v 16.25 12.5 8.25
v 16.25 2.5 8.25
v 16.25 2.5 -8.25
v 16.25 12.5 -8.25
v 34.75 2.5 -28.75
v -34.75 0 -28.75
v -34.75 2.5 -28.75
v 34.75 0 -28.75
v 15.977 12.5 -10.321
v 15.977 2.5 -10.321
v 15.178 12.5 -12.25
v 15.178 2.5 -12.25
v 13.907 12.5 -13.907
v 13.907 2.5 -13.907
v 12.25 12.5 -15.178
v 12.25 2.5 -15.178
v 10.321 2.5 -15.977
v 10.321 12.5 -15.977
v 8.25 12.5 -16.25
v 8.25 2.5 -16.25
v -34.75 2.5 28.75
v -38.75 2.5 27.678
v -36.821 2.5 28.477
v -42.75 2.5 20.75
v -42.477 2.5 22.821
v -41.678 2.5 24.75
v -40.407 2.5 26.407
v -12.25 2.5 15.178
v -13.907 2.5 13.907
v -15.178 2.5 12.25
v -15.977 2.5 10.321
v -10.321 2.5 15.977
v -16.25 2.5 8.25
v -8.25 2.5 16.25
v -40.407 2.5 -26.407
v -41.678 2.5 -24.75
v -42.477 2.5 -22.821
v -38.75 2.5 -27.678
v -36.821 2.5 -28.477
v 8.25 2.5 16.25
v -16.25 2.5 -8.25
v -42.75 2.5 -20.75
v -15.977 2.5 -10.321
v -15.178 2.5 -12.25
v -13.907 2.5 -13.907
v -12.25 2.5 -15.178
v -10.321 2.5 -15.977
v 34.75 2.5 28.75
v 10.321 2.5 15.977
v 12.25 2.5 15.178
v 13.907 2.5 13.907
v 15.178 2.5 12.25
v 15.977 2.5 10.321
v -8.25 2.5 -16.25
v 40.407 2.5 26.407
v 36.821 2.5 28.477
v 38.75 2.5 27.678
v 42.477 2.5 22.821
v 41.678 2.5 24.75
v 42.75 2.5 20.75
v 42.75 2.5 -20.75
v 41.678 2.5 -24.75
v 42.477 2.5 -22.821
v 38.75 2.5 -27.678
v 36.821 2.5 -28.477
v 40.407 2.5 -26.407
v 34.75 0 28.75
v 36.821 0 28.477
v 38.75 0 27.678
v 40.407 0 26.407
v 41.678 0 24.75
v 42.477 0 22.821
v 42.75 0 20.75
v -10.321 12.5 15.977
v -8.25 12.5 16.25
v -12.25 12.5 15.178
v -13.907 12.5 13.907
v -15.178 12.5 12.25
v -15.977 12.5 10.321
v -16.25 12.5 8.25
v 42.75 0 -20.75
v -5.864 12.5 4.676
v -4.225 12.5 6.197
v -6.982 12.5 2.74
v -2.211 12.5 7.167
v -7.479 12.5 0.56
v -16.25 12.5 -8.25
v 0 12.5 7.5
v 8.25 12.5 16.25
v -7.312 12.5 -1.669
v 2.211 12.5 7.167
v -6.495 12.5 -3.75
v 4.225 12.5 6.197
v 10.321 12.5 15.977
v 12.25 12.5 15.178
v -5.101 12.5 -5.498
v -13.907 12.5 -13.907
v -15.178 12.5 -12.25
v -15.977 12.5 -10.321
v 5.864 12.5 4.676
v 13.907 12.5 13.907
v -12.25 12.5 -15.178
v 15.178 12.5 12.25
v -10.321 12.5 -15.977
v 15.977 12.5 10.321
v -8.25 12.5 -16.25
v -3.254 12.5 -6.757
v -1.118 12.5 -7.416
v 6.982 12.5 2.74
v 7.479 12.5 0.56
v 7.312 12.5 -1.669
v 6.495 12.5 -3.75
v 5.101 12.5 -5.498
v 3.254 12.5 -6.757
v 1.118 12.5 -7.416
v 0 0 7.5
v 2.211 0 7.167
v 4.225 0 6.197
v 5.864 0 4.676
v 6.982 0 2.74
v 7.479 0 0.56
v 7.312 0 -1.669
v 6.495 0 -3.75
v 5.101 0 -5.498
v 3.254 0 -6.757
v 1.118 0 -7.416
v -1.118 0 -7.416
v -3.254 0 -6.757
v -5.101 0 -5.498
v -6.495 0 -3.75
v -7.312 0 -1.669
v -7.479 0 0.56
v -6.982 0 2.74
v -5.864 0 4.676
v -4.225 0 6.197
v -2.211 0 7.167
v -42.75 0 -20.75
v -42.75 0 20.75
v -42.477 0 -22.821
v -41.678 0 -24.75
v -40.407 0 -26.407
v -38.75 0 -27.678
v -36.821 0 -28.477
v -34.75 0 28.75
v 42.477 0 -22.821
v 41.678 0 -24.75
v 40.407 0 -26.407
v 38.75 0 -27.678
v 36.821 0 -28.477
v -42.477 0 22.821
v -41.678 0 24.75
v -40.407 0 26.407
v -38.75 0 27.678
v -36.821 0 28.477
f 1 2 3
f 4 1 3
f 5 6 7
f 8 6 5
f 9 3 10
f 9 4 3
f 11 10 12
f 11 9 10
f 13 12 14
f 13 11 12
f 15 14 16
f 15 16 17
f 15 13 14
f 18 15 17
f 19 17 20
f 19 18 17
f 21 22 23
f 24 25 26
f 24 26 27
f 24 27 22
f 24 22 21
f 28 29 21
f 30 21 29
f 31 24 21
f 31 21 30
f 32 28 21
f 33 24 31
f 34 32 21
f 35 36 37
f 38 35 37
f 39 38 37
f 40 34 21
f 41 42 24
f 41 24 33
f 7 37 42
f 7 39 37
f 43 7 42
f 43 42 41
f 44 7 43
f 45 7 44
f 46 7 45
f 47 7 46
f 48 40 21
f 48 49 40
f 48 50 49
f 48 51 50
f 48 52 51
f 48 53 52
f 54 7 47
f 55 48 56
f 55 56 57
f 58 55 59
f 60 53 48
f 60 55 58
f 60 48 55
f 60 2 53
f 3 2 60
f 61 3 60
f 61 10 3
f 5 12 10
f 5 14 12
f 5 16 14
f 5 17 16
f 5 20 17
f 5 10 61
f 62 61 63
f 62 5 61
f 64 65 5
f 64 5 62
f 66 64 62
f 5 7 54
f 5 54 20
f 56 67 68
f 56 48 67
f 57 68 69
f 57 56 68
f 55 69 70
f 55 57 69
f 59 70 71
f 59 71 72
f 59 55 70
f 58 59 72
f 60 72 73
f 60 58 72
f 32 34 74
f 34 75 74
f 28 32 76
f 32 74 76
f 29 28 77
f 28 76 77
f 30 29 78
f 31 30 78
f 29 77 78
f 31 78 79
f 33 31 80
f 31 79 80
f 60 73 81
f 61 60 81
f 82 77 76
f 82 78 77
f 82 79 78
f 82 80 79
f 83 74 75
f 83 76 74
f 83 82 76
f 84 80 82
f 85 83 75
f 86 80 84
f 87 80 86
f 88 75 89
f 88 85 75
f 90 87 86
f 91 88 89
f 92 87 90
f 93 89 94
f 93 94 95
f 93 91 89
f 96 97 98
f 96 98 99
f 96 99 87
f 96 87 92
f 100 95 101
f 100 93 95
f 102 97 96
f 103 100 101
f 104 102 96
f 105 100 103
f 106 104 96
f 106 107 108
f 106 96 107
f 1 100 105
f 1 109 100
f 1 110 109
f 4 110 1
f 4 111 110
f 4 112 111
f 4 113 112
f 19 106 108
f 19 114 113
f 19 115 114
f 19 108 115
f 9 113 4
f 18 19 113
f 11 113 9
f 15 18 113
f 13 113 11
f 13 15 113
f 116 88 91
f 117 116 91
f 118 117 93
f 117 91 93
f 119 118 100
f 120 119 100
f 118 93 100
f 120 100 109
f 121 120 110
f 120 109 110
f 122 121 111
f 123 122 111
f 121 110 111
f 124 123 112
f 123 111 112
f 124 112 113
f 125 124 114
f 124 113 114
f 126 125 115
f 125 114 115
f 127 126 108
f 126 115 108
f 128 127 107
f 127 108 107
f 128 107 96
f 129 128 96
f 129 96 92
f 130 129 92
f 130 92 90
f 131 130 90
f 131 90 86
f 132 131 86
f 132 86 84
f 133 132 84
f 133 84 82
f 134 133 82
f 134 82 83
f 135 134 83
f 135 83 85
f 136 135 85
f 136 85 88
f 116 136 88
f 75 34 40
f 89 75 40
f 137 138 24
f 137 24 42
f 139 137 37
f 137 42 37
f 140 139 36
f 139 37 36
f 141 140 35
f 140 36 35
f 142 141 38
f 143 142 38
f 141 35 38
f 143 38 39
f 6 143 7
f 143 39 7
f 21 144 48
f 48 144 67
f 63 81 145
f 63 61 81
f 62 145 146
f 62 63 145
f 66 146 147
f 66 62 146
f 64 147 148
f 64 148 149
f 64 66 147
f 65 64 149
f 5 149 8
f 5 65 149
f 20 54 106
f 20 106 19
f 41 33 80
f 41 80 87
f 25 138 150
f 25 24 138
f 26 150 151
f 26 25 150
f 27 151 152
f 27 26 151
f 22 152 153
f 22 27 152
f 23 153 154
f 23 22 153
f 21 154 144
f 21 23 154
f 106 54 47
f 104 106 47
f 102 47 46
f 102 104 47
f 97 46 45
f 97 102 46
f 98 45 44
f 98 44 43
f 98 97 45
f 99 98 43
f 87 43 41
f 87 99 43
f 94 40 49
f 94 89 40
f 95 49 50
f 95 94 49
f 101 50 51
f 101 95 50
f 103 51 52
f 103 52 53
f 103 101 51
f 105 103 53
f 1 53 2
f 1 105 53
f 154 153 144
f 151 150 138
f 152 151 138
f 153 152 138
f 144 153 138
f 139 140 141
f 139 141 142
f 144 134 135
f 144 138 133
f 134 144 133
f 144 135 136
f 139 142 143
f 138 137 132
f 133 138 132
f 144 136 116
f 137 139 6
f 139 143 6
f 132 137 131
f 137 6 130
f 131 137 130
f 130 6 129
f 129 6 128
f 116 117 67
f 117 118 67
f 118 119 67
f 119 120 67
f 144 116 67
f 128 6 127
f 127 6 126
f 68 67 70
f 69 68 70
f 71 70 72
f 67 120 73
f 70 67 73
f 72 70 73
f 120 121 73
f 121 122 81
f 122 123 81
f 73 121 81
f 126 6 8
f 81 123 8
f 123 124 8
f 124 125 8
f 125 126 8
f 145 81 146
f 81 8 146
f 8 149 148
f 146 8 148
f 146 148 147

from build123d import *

# Parameters (mm, degrees)
CROQUIS1_W              = 85.5
CROQUIS1_H              = 57.5
SALIENTE_EXTRUIR1_DEPTH = 2.5
REDONDEO1_R             = 8
CROQUIS2_W              = 32.5
CROQUIS2_H              = 32.5
SALIENTE_EXTRUIR2_DEPTH = 10
REDONDEO2_R             = 8
CROQUIS3_R              = 7.5
CORTAR_EXTRUIR1_DEPTH   = 54.012970111


with BuildPart() as part:
    # Croquis1 → Saliente-Extruir1 (new body)
    with BuildSketch(Plane(origin=(0, 0, 0), x_dir=(1, 0, 0), z_dir=(0, 1, 0))):
        Rectangle(CROQUIS1_W, CROQUIS1_H)
    extrude(amount=SALIENTE_EXTRUIR1_DEPTH)

    # Redondeo1
    redondeo1_edges = [part.edges().sort_by_distance(p)[0] for p in [
        (42.75, 1.25, 28.75),
        (-42.75, 1.25, 28.75),
        (-42.75, 1.25, -28.75),
        (42.75, 1.25, -28.75),
    ]]
    fillet(redondeo1_edges, radius=REDONDEO1_R)

    # Croquis2 → Saliente-Extruir2 (add)
    with BuildSketch(Plane(origin=(0, 2.5, 0), x_dir=(1, 0, 0), z_dir=(0, 1, 0))):
        Rectangle(CROQUIS2_W, CROQUIS2_H)
    extrude(amount=SALIENTE_EXTRUIR2_DEPTH)

    # Redondeo2
    redondeo2_edges = [part.edges().sort_by_distance(p)[0] for p in [
        (16.25, 7.5, 16.25),
        (16.25, 7.5, -16.25),
        (-16.25, 7.5, -16.25),
        (-16.25, 7.5, 16.25),
    ]]
    fillet(redondeo2_edges, radius=REDONDEO2_R)

    # Croquis3 → Cortar-Extruir1 (cut, through all)
    with BuildSketch(Plane(origin=(0, 12.5, 0), x_dir=(1, 0, 0), z_dir=(0, 1, 0))):
        with Locations(Location((0, 0, 0), (0, 0, 270))):
            Circle(CROQUIS3_R)
    extrude(amount=-CORTAR_EXTRUIR1_DEPTH, mode=Mode.SUBTRACT)


solid = part.part
